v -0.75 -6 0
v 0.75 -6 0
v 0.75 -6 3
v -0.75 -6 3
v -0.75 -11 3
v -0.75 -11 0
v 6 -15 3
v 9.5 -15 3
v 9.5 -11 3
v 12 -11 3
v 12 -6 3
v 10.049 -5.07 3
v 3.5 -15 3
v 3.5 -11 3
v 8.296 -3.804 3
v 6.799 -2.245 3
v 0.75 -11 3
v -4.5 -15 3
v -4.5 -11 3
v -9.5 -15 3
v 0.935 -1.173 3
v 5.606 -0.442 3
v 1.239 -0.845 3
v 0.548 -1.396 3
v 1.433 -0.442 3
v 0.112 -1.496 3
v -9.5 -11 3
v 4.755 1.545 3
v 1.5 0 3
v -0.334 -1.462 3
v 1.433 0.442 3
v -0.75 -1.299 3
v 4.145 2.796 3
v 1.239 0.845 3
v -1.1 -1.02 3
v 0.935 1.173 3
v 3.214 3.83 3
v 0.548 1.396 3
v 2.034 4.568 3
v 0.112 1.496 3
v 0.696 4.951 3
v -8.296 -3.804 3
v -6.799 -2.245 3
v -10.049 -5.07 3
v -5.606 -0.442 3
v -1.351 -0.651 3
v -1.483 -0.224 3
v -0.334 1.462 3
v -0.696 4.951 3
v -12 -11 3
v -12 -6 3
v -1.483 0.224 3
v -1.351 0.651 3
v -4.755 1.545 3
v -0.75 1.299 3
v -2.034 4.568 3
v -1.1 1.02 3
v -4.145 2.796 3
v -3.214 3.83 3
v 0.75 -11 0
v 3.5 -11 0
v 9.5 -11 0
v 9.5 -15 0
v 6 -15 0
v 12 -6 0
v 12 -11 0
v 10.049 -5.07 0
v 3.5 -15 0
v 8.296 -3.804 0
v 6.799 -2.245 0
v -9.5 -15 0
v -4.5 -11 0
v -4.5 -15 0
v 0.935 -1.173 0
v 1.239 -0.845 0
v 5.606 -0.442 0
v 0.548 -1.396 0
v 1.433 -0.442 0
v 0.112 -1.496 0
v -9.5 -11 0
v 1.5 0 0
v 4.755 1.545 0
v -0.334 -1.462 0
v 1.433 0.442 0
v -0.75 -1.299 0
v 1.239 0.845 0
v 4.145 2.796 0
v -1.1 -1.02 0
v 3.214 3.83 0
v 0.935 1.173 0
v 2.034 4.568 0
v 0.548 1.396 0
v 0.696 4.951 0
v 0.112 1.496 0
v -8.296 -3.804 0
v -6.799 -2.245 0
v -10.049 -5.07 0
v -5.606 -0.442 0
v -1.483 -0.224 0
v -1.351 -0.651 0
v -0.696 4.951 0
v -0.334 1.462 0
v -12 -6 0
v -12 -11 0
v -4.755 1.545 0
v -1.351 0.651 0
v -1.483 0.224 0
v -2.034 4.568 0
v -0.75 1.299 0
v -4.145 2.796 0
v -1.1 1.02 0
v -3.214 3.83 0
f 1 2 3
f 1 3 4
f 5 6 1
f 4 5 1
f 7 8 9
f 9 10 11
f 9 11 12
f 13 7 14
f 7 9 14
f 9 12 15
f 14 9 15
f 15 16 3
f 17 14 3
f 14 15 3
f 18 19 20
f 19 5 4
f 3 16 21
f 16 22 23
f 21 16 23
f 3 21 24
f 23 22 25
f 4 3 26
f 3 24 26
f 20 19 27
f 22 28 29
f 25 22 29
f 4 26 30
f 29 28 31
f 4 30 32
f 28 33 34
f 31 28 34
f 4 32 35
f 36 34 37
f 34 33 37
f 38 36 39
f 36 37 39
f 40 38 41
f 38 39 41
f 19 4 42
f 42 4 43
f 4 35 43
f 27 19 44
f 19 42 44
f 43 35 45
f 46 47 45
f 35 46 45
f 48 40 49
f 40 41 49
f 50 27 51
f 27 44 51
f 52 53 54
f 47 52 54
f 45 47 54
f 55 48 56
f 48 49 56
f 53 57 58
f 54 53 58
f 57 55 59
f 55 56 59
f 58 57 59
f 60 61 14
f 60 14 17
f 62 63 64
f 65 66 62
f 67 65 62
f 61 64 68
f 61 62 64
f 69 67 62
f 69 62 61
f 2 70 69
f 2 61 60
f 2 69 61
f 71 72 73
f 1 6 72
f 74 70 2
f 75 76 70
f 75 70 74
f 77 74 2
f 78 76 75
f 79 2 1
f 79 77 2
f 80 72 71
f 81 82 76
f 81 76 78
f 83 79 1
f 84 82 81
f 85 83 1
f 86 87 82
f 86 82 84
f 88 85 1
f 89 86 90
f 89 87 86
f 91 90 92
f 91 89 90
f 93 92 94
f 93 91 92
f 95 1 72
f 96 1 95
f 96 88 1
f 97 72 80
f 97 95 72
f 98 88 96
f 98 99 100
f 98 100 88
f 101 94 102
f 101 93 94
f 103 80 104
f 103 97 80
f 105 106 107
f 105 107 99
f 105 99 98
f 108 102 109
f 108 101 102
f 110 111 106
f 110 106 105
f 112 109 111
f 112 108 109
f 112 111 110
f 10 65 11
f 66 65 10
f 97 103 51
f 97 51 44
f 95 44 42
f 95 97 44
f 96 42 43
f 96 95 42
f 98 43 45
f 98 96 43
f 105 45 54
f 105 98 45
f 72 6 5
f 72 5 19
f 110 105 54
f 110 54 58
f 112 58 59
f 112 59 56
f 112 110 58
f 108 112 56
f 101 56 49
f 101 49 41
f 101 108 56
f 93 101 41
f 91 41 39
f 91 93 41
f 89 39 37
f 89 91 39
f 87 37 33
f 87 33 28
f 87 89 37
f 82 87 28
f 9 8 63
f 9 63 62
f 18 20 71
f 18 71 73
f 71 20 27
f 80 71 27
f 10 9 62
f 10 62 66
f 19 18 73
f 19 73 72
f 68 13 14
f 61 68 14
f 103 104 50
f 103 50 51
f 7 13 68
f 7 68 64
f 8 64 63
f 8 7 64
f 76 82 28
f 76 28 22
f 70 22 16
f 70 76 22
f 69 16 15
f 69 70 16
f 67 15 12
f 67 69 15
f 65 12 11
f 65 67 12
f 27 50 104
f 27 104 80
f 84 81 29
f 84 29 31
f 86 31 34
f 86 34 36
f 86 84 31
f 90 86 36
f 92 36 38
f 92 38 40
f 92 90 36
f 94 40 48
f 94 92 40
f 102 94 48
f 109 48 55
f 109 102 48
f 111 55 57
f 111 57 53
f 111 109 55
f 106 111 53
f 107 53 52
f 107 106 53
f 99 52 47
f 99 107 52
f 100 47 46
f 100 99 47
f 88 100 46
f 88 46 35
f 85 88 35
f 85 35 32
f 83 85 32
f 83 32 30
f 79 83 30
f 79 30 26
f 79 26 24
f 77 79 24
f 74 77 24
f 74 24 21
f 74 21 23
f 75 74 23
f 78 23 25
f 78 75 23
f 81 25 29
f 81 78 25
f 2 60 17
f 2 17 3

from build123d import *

# Parameters (mm, degrees)
SKETCH1_R           = 1.5
SKETCH1_R_2         = 1
BOSS_EXTRUDE1_DEPTH = 3
SKETCH2_W           = 21.215315346
SKETCH2_H           = 10.620784377
CUT_EXTRUDE1_DEPTH  = 4
SKETCH3_W           = 2.5
SKETCH3_H           = 4
CUT_EXTRUDE2_DEPTH  = 10
SKETCH4_W           = 2.5
SKETCH4_H           = 4
BOSS_EXTRUDE2_DEPTH = 3
SKETCH5_W           = 2.5
SKETCH5_H           = 5.5
BOSS_EXTRUDE3_DEPTH = 3
SKETCH6_W           = 1.5
SKETCH6_H           = 10
CUT_EXTRUDE3_DEPTH  = 5


with BuildPart() as part:
    # Sketch1 → Boss-Extrude1 (new body)
    with BuildSketch(Plane.XY):
        with BuildLine():
            Line((-1.25, -11), (-7, -11))
            Line((-7, -11), (-7, -15))
            Line((-7, -15), (-12, -15))
            Line((-12, -15), (-12, -11))
            Line((-12, -11), (-12, -6))
            ThreePointArc((-12, -6), (-7.512319363, -3.05842228), (-4.755323166, 1.544960058))
            ThreePointArc((-4.755323166, 1.544960058), (0, 5), (4.755323166, 1.544960058))
            ThreePointArc((4.755323166, 1.544960058), (7.512319363, -3.05842228), (12, -6))
            Line((12, -6), (12, -22.5))
            ThreePointArc((12, -22.5), (11.267766953, -24.267766953), (9.5, -25))
            Line((9.5, -25), (8.5, -25))
            ThreePointArc((8.5, -25), (6.732233047, -24.267766953), (6, -22.5))
            Line((6, -22.5), (6, -11))
            Line((6, -11), (1.25, -11))
            Line((1.25, -11), (1.25, -5.5))
            Line((1.25, -5.5), (-1.25, -5.5))
            Line((-1.25, -5.5), (-1.25, -11))
        make_face()
        Circle(SKETCH1_R, mode=Mode.SUBTRACT)
        with Locations((9, -22)):
            Circle(SKETCH1_R_2, mode=Mode.SUBTRACT)
    extrude(amount=BOSS_EXTRUDE1_DEPTH)

    # Sketch2 → Cut-Extrude1 (cut, through all)
    with BuildSketch(Plane.XY.offset(3)):
        with Locations((3.607657673, -20.310392189)):
            Rectangle(SKETCH2_W, SKETCH2_H)
    extrude(amount=-CUT_EXTRUDE1_DEPTH, mode=Mode.SUBTRACT)

    # Sketch3 → Cut-Extrude2 (cut)
    with BuildSketch(Plane.XY.offset(3)):
        with Locations((10.75, -13)):
            Rectangle(SKETCH3_W, SKETCH3_H)
        with Locations((-10.75, -13)):
            Rectangle(SKETCH3_W, SKETCH3_H)
    extrude(amount=-CUT_EXTRUDE2_DEPTH, mode=Mode.SUBTRACT)

    # Sketch4 → Boss-Extrude2 (add)
    with BuildSketch(Plane.XY.offset(3)):
        with Locations((-5.75, -13)):
            Rectangle(SKETCH4_W, SKETCH4_H)
        with Locations((4.75, -13)):
            Rectangle(SKETCH4_W, SKETCH4_H)
    extrude(amount=-BOSS_EXTRUDE2_DEPTH)

    # Sketch5 → Boss-Extrude3 (add)
    with BuildSketch(Plane(origin=(0, 0, 0), x_dir=(-1, 0, 0), z_dir=(0, 0, -1))):
        with Locations((0, -8.25)):
            Rectangle(SKETCH5_W, SKETCH5_H)
    extrude(amount=-BOSS_EXTRUDE3_DEPTH)

    # Sketch6 → Cut-Extrude3 (cut)
    with BuildSketch(Plane(origin=(0, 0, 0), x_dir=(-1, 0, 0), z_dir=(0, 0, -1))):
        with Locations((0, -11)):
            Rectangle(SKETCH6_W, SKETCH6_H)
    extrude(amount=-CUT_EXTRUDE3_DEPTH, mode=Mode.SUBTRACT)


solid = part.part
